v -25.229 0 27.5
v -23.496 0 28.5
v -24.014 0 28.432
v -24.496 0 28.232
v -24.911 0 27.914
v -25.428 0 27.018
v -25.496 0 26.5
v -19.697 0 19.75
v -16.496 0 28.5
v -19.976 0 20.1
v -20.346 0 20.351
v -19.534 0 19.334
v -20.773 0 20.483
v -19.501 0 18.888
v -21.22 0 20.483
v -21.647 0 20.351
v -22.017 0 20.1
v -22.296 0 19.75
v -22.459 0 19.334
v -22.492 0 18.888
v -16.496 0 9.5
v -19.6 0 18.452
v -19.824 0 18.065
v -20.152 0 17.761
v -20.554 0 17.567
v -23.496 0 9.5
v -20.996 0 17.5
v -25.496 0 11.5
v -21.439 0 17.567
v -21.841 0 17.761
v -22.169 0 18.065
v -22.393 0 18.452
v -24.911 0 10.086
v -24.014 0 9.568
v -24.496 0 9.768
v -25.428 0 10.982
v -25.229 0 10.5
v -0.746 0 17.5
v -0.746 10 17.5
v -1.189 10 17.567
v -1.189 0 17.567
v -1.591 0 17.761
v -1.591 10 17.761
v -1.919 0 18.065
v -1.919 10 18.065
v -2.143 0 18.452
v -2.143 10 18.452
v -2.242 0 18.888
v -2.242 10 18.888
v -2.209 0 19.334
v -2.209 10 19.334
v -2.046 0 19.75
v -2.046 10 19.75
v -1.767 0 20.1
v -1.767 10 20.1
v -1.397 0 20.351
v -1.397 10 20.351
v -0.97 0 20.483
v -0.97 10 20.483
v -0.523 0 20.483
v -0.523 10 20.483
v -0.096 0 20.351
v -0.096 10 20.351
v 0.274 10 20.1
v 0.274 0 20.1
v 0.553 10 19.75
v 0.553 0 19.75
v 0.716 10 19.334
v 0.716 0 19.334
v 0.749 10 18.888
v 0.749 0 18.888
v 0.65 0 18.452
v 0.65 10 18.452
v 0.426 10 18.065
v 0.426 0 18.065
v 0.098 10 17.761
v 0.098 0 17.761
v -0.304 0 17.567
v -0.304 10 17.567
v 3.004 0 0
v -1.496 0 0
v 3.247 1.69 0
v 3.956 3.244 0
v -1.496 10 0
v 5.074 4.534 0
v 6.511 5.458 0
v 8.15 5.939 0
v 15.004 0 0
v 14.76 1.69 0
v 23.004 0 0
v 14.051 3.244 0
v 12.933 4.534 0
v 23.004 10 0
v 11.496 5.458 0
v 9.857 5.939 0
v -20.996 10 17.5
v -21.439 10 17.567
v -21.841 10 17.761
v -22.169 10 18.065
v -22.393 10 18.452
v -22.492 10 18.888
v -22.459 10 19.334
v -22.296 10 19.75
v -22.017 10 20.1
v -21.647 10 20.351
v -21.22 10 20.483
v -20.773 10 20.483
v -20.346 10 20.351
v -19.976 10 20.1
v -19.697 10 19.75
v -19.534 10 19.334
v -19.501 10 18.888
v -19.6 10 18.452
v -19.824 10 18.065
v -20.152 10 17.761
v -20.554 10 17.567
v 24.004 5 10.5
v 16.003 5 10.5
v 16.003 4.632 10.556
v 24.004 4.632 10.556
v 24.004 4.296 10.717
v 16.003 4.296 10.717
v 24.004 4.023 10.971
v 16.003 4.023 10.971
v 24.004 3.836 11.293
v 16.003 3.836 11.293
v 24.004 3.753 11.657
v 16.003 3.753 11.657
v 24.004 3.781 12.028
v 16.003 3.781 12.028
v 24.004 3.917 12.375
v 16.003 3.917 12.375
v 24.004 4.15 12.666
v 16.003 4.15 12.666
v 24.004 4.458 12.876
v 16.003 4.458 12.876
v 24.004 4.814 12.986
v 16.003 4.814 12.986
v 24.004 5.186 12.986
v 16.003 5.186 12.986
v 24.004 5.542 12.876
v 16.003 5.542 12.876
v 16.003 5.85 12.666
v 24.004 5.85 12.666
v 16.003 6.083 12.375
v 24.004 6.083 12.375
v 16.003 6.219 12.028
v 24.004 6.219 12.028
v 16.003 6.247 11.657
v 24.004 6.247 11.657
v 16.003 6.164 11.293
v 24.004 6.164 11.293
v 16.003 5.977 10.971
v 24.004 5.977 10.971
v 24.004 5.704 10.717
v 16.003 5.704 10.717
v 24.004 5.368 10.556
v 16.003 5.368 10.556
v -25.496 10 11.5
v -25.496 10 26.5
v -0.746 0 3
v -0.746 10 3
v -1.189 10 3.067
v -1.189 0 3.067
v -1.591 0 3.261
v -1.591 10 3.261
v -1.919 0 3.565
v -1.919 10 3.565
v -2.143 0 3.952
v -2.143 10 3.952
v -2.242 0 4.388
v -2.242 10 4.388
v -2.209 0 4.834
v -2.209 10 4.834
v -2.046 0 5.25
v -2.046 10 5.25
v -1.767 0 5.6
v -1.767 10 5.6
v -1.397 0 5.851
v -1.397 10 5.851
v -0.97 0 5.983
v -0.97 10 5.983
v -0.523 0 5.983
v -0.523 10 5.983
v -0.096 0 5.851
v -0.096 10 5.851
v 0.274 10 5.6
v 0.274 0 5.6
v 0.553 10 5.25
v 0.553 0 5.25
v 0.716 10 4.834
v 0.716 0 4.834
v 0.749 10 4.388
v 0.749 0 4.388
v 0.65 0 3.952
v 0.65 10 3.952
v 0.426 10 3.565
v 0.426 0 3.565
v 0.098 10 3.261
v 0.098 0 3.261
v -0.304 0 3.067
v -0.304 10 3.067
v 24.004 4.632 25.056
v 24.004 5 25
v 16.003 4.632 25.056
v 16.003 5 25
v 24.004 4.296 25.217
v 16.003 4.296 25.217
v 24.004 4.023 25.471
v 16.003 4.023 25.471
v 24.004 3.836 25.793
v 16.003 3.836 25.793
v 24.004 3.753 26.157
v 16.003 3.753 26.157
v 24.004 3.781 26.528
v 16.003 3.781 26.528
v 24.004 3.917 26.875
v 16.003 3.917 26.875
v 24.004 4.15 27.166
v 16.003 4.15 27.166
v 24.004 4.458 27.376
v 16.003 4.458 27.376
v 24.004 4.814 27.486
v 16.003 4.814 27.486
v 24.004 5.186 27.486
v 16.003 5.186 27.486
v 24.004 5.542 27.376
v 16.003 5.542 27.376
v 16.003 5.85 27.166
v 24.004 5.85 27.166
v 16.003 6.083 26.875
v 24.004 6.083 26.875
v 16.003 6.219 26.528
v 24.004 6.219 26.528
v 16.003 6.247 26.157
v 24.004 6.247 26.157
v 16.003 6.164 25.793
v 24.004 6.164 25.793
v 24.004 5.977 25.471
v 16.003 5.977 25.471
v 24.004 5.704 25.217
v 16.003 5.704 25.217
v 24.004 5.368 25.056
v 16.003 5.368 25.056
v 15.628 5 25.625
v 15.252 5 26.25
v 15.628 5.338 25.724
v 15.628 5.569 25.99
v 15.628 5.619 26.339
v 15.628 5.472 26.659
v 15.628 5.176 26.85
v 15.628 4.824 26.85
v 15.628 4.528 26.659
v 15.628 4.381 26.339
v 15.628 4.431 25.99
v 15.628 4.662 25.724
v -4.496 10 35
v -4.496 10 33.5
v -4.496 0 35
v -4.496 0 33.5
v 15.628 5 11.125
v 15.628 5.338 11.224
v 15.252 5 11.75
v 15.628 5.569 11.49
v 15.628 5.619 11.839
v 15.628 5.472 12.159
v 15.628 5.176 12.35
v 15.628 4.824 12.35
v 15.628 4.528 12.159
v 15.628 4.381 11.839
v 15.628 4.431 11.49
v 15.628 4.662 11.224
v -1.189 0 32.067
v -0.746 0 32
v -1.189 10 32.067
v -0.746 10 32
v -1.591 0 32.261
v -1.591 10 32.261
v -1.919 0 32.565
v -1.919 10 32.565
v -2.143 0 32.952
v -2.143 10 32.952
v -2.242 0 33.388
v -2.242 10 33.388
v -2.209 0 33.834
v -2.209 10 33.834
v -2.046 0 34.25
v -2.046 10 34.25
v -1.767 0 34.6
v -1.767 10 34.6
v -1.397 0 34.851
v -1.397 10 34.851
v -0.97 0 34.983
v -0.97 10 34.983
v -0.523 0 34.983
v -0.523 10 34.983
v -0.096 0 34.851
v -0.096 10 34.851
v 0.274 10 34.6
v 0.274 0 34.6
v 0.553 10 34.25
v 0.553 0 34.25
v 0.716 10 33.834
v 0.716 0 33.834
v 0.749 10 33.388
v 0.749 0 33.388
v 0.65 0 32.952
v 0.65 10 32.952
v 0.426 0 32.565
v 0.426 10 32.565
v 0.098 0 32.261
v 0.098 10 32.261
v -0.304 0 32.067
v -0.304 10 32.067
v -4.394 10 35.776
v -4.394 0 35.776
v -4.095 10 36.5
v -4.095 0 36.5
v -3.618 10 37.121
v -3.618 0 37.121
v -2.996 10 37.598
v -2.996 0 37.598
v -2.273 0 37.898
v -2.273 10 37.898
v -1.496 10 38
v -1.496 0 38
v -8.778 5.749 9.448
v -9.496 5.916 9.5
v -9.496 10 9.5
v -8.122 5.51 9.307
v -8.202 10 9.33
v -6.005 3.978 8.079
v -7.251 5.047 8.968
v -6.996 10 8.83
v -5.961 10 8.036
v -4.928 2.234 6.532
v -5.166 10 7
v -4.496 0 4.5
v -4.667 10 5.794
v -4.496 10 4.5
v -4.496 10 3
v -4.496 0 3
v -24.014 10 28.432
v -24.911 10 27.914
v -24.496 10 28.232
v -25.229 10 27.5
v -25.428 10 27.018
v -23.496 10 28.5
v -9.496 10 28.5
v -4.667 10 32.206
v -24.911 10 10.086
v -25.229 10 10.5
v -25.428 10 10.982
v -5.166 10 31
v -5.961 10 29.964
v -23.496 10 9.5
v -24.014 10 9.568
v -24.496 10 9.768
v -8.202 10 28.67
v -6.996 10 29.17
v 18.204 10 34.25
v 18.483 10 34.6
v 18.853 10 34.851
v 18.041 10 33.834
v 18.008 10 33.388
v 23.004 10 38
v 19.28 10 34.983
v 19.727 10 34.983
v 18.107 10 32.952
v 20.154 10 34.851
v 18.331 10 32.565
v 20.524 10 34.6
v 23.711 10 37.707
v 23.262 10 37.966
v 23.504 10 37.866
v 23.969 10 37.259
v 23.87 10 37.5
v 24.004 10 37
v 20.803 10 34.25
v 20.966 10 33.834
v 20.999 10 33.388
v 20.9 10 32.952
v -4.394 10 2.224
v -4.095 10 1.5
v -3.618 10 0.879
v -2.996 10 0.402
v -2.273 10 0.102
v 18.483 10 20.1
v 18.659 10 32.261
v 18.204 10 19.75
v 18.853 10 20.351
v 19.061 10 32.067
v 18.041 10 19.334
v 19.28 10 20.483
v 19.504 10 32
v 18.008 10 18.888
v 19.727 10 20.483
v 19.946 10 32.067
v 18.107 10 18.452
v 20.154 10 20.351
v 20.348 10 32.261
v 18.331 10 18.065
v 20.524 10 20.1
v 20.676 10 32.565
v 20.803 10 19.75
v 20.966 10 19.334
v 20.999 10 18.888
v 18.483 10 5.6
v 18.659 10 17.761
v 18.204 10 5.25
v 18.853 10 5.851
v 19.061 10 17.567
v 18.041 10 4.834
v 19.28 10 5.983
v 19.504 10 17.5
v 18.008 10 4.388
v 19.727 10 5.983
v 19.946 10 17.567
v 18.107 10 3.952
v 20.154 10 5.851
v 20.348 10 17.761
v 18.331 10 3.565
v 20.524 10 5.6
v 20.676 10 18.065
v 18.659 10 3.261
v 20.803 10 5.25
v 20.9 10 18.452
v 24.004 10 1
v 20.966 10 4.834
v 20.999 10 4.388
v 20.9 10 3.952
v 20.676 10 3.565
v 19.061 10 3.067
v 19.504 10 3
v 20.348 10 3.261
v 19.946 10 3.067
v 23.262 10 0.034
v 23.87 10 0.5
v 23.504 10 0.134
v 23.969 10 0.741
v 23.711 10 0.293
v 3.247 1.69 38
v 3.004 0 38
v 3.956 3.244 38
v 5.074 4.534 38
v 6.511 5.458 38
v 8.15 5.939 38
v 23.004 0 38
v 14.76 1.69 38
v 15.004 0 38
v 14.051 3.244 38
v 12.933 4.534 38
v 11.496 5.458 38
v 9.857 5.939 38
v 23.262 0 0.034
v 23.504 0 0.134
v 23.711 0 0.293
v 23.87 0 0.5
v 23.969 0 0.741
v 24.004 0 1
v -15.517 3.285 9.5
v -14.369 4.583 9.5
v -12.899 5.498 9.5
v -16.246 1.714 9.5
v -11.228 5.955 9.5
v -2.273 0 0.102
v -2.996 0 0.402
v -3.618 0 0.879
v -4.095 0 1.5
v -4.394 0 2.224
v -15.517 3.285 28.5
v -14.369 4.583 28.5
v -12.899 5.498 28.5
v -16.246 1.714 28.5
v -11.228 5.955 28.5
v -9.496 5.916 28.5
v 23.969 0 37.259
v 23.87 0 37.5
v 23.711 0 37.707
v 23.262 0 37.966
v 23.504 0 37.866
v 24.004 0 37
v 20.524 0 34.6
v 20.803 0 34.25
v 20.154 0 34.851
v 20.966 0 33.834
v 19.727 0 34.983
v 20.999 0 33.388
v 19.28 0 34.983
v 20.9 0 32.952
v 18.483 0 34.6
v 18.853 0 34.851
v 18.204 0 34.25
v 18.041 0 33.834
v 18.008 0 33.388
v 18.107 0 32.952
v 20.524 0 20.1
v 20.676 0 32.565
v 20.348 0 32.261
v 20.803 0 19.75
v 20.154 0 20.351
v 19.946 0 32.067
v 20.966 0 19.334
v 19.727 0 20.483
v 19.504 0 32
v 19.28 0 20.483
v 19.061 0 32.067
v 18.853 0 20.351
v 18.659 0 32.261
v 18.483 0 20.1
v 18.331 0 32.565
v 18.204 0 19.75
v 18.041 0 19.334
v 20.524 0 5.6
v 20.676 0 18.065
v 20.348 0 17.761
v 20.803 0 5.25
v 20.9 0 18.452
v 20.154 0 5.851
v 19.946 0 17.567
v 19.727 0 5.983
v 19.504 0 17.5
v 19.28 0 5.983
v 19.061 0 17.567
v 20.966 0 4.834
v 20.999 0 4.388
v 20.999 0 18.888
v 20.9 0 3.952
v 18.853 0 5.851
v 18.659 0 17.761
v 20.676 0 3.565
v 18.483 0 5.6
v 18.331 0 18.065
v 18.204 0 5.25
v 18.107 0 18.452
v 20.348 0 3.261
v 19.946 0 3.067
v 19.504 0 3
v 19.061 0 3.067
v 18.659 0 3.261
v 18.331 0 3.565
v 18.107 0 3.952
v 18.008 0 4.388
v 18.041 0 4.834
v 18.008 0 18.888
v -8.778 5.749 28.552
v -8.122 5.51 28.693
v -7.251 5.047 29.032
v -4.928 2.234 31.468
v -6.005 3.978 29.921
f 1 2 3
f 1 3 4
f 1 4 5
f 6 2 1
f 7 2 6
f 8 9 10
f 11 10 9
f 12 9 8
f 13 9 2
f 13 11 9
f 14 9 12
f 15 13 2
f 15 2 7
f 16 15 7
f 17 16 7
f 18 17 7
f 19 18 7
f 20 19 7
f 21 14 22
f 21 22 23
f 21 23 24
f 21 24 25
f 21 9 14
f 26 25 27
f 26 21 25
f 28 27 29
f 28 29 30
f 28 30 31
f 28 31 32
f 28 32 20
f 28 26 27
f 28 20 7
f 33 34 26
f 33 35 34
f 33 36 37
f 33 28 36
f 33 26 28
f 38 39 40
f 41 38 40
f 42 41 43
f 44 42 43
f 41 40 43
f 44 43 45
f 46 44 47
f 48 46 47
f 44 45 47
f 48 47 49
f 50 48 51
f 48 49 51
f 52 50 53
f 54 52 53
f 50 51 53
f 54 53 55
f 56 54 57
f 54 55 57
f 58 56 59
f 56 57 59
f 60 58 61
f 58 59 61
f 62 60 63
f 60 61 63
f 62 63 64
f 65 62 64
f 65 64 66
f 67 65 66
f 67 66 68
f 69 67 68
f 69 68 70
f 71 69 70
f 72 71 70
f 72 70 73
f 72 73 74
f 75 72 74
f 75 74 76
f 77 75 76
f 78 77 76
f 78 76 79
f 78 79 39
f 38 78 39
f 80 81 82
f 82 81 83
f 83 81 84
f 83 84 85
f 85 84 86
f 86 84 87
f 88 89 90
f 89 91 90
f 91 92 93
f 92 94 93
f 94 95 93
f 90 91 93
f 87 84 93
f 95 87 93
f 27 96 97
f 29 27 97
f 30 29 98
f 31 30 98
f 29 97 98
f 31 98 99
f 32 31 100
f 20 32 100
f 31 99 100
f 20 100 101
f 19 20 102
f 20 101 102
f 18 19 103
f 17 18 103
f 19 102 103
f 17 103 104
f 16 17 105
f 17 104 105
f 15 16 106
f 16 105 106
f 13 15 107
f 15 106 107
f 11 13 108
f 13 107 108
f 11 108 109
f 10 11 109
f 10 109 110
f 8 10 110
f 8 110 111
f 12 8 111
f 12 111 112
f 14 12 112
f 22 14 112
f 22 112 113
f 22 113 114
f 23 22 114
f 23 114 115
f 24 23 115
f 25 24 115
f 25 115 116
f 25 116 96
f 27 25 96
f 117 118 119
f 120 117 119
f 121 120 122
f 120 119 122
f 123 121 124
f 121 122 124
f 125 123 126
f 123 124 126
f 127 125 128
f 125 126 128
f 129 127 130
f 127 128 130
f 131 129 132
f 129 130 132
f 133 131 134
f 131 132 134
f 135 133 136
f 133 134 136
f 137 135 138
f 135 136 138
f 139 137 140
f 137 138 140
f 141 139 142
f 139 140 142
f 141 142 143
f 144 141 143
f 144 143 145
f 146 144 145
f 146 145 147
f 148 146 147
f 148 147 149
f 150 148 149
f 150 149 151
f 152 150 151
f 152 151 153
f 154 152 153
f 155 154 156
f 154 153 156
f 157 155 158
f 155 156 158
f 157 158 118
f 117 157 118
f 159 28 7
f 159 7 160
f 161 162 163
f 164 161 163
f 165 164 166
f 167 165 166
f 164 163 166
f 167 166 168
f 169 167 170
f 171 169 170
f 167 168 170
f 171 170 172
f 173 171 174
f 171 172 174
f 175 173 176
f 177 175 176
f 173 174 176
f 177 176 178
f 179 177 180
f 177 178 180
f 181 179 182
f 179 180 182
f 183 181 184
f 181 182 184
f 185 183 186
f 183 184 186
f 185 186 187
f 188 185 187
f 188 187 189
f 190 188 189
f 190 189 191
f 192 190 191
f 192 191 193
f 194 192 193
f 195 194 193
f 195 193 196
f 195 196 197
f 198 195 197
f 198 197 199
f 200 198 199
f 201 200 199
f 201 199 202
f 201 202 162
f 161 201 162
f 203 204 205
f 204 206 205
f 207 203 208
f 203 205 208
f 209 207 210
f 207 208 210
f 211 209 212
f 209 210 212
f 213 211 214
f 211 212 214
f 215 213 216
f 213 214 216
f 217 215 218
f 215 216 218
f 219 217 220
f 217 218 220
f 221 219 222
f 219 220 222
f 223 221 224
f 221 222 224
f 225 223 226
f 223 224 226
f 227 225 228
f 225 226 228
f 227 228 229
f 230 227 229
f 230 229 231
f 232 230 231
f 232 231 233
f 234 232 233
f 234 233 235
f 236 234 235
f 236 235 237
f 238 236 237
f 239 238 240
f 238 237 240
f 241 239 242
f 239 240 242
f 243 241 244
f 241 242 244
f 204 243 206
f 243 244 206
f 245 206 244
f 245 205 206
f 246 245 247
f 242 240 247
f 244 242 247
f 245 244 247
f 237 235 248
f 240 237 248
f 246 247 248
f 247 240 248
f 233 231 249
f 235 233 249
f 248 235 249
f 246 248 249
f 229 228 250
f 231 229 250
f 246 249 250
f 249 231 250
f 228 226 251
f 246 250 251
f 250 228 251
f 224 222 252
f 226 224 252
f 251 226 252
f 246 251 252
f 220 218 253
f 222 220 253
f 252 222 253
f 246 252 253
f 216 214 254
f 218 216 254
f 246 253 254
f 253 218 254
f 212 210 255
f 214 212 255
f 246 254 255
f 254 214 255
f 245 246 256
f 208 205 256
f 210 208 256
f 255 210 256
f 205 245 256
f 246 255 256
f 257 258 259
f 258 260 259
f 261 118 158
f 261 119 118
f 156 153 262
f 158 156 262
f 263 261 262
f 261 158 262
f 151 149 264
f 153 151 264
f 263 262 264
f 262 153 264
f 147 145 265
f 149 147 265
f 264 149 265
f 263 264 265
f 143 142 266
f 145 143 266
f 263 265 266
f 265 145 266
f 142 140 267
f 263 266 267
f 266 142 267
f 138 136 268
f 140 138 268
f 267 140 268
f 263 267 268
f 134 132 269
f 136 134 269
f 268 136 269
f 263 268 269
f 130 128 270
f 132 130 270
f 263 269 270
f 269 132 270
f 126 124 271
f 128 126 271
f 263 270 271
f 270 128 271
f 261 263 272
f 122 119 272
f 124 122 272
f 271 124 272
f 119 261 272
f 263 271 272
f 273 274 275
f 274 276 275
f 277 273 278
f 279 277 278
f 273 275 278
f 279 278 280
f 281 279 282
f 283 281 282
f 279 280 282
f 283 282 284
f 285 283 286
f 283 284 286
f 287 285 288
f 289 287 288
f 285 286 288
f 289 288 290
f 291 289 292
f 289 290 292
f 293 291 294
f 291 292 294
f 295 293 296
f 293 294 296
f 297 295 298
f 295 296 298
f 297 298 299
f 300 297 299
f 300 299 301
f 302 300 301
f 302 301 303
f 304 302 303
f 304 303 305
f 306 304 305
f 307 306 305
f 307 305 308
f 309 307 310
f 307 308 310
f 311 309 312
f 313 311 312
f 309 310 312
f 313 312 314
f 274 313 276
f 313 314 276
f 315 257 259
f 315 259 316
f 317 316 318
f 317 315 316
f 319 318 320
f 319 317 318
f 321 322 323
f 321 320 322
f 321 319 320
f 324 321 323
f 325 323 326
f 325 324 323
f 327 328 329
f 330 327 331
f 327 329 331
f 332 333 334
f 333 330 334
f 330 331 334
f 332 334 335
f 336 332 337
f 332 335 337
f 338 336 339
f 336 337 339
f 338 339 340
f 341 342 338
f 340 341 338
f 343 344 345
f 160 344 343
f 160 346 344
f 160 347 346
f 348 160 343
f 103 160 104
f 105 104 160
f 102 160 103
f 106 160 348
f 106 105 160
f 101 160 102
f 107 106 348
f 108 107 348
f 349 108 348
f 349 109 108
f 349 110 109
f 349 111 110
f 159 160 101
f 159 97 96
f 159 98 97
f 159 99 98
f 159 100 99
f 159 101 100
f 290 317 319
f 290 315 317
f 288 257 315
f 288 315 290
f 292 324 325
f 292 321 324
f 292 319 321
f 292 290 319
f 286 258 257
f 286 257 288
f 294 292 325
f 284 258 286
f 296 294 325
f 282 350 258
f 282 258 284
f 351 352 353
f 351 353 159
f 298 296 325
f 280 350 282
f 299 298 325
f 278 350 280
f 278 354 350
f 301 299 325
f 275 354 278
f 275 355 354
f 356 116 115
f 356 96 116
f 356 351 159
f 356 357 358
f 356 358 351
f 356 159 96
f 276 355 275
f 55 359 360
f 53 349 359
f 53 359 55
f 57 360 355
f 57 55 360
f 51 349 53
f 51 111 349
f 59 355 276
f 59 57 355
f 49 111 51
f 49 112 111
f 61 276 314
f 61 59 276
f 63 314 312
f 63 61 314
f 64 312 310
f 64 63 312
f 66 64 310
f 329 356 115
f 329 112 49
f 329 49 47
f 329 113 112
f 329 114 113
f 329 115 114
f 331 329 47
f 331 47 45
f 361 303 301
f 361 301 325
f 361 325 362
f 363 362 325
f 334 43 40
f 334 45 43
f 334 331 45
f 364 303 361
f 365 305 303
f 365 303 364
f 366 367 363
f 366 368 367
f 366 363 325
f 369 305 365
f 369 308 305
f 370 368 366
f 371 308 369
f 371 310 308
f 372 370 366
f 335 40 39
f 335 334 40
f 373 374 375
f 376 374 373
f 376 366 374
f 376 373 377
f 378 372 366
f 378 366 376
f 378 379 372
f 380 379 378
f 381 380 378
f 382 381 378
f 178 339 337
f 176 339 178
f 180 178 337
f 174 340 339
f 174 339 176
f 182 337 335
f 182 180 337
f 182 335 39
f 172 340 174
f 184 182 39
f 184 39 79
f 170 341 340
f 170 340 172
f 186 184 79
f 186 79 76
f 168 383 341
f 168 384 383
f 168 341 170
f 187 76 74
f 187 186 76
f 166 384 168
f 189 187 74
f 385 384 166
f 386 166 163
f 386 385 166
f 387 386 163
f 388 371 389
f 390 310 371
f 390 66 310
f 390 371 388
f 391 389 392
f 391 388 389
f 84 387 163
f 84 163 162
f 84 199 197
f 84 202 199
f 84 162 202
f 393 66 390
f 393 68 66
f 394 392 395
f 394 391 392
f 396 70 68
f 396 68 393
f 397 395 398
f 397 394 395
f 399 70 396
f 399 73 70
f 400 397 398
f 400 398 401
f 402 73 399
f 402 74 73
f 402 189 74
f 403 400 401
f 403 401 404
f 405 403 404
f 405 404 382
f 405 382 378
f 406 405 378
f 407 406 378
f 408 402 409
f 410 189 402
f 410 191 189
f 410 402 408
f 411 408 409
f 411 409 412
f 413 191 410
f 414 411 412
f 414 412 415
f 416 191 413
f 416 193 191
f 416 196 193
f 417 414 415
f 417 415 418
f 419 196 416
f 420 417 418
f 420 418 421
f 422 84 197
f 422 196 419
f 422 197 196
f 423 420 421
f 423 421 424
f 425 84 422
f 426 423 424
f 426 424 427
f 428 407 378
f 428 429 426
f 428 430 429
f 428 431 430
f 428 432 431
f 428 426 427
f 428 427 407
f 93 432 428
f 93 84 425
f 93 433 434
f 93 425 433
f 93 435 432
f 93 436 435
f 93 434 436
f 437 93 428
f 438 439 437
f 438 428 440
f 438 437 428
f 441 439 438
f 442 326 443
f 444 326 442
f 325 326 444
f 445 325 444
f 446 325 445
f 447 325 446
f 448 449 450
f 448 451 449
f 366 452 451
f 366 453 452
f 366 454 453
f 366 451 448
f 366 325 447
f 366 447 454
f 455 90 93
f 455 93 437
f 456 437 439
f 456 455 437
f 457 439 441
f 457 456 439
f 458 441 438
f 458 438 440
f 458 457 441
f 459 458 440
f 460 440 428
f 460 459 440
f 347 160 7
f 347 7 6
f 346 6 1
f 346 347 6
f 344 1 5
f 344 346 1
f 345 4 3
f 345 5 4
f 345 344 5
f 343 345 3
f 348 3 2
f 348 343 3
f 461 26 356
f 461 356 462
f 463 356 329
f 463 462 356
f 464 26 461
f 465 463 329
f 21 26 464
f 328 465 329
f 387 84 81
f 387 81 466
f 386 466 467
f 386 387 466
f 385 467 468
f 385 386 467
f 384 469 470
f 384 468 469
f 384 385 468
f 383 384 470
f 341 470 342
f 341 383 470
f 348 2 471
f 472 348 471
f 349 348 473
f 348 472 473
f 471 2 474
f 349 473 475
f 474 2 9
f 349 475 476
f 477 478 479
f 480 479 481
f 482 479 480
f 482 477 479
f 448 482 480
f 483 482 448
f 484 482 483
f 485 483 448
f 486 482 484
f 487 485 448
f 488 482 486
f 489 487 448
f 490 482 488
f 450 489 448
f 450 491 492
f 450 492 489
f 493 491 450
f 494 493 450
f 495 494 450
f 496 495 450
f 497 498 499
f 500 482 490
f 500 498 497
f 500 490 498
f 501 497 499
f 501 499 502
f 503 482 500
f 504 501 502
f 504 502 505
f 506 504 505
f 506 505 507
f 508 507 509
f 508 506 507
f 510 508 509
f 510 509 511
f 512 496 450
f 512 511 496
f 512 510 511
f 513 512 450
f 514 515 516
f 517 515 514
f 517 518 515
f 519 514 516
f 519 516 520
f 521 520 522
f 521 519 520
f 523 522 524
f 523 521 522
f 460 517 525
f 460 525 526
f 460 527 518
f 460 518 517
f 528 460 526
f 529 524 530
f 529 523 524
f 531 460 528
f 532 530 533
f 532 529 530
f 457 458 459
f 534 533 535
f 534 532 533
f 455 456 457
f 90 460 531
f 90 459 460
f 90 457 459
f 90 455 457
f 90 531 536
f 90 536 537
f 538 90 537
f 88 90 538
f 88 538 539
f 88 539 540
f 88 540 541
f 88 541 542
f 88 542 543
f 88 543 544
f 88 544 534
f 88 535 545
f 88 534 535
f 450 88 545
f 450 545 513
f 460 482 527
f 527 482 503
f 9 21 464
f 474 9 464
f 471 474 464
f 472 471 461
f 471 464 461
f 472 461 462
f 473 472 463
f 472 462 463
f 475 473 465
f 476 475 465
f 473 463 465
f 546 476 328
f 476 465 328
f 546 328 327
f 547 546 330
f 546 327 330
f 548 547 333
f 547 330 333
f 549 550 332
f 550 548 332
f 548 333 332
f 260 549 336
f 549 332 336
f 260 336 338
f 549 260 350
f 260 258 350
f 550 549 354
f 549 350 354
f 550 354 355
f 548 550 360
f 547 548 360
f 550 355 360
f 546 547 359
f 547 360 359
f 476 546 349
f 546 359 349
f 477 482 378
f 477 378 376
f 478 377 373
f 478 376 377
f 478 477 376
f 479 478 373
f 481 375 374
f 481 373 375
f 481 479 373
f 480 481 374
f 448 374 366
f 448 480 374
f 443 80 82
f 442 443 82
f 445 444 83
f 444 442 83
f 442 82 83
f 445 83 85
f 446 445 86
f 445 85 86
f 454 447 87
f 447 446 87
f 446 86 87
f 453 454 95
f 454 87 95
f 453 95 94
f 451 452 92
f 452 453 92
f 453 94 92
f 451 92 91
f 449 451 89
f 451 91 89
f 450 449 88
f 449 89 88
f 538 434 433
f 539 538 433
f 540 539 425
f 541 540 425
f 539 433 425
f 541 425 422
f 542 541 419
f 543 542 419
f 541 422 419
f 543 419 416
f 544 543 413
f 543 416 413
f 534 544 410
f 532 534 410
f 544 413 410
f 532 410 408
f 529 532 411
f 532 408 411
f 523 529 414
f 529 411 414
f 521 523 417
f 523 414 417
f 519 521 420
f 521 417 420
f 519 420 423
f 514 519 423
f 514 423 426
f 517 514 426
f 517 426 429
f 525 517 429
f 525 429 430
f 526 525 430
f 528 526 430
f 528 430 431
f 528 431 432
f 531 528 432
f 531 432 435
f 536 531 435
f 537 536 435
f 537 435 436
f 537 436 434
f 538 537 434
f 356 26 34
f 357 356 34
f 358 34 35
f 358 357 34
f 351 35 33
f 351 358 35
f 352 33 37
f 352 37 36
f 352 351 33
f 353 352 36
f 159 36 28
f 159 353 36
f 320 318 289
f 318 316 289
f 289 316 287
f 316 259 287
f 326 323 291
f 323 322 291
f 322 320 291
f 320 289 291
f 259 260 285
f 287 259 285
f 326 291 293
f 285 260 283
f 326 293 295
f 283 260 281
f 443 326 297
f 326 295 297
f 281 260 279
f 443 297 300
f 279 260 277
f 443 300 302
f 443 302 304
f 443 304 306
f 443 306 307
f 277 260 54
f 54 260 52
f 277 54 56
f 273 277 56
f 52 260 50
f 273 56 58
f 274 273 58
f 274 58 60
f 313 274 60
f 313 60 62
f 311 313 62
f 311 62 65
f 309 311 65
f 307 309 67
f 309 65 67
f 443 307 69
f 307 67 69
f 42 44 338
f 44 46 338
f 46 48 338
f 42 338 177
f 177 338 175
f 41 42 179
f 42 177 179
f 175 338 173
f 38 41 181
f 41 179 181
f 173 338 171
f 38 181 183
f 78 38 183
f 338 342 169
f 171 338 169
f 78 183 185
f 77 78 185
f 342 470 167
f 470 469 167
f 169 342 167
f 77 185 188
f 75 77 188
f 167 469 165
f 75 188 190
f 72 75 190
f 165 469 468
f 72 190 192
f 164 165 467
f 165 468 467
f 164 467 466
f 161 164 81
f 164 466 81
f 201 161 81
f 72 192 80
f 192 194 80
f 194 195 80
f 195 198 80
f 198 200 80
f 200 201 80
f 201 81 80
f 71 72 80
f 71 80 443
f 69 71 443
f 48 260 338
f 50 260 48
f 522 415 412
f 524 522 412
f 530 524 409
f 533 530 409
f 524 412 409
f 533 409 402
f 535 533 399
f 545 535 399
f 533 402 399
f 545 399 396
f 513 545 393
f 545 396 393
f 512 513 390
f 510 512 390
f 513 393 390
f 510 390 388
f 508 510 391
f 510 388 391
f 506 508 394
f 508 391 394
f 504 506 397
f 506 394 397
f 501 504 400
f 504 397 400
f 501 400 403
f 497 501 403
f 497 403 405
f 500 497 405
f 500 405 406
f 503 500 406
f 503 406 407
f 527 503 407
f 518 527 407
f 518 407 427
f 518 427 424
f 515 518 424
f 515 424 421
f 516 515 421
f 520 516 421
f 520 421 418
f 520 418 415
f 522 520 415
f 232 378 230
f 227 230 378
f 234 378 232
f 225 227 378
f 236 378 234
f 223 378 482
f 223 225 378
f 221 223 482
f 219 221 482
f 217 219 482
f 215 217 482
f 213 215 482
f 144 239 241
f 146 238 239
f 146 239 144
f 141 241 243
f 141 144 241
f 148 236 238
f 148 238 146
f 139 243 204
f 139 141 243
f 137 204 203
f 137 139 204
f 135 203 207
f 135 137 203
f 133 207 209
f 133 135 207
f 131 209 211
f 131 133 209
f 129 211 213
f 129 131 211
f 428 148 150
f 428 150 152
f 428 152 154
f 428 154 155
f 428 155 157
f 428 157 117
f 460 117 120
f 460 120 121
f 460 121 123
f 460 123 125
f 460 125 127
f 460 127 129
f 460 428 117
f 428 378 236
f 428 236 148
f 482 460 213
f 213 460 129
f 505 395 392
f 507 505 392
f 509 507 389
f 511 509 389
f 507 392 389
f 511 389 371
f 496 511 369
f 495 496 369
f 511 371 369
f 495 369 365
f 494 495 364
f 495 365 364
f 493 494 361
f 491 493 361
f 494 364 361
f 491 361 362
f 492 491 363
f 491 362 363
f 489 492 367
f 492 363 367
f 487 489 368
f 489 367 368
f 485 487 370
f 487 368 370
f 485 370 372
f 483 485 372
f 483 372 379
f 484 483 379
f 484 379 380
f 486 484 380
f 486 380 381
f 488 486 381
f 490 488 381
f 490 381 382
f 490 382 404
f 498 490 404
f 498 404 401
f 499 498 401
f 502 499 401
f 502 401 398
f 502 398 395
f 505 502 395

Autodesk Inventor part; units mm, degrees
ref_plane "YZ Plane" through (0, 0, 0) normal (1, 0, 0) x (0, 1, 0)
ref_plane "XZ Plane" through (0, 0, 0) normal (0, 1, 0) x (-1, 0, 0)
ref_plane "XY Plane" through (0, 0, 0) normal (0, 0, 1) x (1, 0, 0)
sketch "Sketch1" plane through (0, 0, 0) normal (0, 0, 1) x (1, 0, 0)
  circle A0 centre (9.0035, 0) radius 6
  circle A1 centre (-10.4965, 0) radius 6
  line L0 (-16.4965, 0) -> (-25.4965, 0)
  line L1 (-25.4965, 0) -> (-25.4965, 10)
  line L2 (-25.4965, 10) -> (24.0035, 10)
  line L3 (24.0035, 10) -> (24.0035, 0)
  line L4 (24.0035, 0) -> (15.0035, 0)
  line L5 (-4.4965, 0) -> (3.0035, 0)
  point P0 (0, 0)
  dimension "d4" = 12
  dimension "d5" = 12
  dimension "d6" = 19.5
  dimension "d7" = 0
  dimension "d8" = 0
  dimension "d9" = 9
  dimension "d10" = 9
  dimension "d11" = 10
  dimension "d12" = 0
extrude "Extrusion1" add sketch "Sketch1" along normal blind 38 contours A0 L5 A1 L0 L1 L2 L3 L4
sketch "Sketch2" plane through (-4.4965, 0, 0) normal (0, -1, 0) x (1, 0, 0)
  line L0 (-21, 0) -> (-12, 0) projected
  line L1 (-12, 0) -> (-12, 38) projected
  line L2 (-21, 38) -> (-12, 38) projected
  line L3 (-21, 0) -> (-21, 38) projected
  line L4 (0, 0) -> (7.5, 0) projected
  line L5 (7.5, 0) -> (7.5, 38) projected
  line L6 (0, 38) -> (7.5, 38) projected
  line L7 (0, 0) -> (0, 38) projected
  line L8 (19.5, 0) -> (28.5, 0) projected
  line L9 (28.5, 0) -> (28.5, 38) projected
  line L10 (19.5, 38) -> (28.5, 38) projected
  line L11 (19.5, 0) -> (19.5, 38) projected
  line L12 (-21, 0) -> (-12, 0) projected
  line L13 (-21, 0) -> (0, 0)
  line L14 (-21, 9.5) -> (0, 9.5)
  line L15 (-21, 28.5) -> (0, 28.5)
  line L16 (0, 0) -> (0, 38) projected
  line L17 (-12, 38) -> (0, 38) projected
  line L18 (-21, 38) -> (0, 38)
  point P0 (4.4965, 0)
  dimension "d17" = 19
  dimension "d18" = 9.5
extrude "Extrusion2" cut sketch "Sketch2" against normal through all contours L3 L14 L1 L0 | L1 L14 L7 L13 | L3 L2 L1 L15 | L1 L17 L7 L15
fillet "Fillet1" radius 5 2 edges at (-4.4965, 5, 28.5) (-4.4965, 5, 9.5)
fillet "Fillet2" radius 3 2 edges at (-4.4965, 5, 0) (-4.4965, 5, 38)
fillet "Fillet2" radius 1 2 edges at (24.0035, 5, 38) (24.0035, 5, 0)
fillet "Fillet2" radius 2 2 edges at (-25.4965, 5, 9.5) (-25.4965, 5, 28.5)
sketch "Sketch3" plane through (3.0035, 0, 0) normal (0, -1, 0) x (1, 0, 0)
  arc A0 (-28.5, 11.5) -> (-26.5, 9.5) centre (-26.5, 11.5) ccw projected
  line L0 (-26.5, 9.5) -> (-19.5, 9.5) projected
  line L1 (-19.5, 9.5) -> (-19.5, 28.5) projected
  line L2 (-19.5, 28.5) -> (-26.5, 28.5) projected
  arc A1 (-26.5, 28.5) -> (-28.5, 26.5) centre (-26.5, 26.5) ccw projected
  line L3 (-28.5, 11.5) -> (-28.5, 26.5) projected
  arc A2 (-4.5, 38) -> (-7.5, 35) centre (-4.5, 35) ccw projected
  line L4 (-7.5, 33.5) -> (-7.5, 35) projected
  line L5 (-7.5, 4.5) -> (-7.5, 33.5) projected
  line L6 (-7.5, 3) -> (-7.5, 4.5) projected
  arc A3 (-7.5, 3) -> (-4.5, 0) centre (-4.5, 3) ccw projected
  line L7 (-4.5, 0) -> (0, 0) projected
  line L8 (0, 0) -> (0, 38) projected
  line L9 (-4.5, 38) -> (0, 38) projected
  arc A4 (21, 37) -> (20, 38) centre (20, 37) ccw projected
  line L10 (12, 38) -> (20, 38) projected
  line L11 (12, 0) -> (12, 38) projected
  line L12 (12, 0) -> (20, 0) projected
  arc A5 (20, 0) -> (21, 1) centre (20, 1) ccw projected
  line L13 (21, 1) -> (21, 37) projected
  point P0 (-3.0035, 0)
  point P1 (-3.75, 4.5)
  point P2 (-3.75, 19)
  point P3 (-3.75, 33.5)
  point P4 (16.5, 4.5)
  point P5 (16.5, 19)
  point P6 (16.5, 33.5)
  point P7 (-24, 19)
  dimension "d23" = 7.5
  dimension "d24" = 3.75
  dimension "d25" = 9
  dimension "d26" = 4.5
  dimension "d27" = 9
  dimension "d28" = 4.5
  dimension "d29" = 19
  dimension "d30" = 9.5
  dimension "d31" = 4.5
  dimension "d32" = 4.5
hole "Hole1" at (-0.7465, 0, 4.5) at (-0.7465, 0, 19) at (-0.7465, 0, 33.5) at (19.5035, 0, 4.5) at (19.5035, 0, 19) at (19.5035, 0, 33.5) at (-20.9965, 0, 19) direction (0, 1, 0) diameter 3 end through all
sketch "Sketch4" plane through (24.0035, 0, 1) normal (1, 0, 0) x (0, 0, -1)
  line L0 (-16.5, 10) -> (-16.5, 0) projected
  line L1 (-19.5, 10) -> (-19.5, 0) projected
  line L2 (-31, 10) -> (-31, 0) projected
  line L3 (-5, 10) -> (-5, 0) projected
  line L4 (0, 10) -> (0, 0) projected
  line L5 (0, 10) -> (-36, 10) projected
  line L6 (-36, 0) -> (-36, 10) projected
  line L7 (0, 0) -> (-36, 0) projected
  point P0 (1, 0)
  point P1 (-25.25, 5)
  point P2 (-10.75, 5)
  dimension "d41" = 11.5
  dimension "d42" = 11.5
  dimension "d43" = 5.75
  dimension "d44" = 5.75
  dimension "d45" = 10
  dimension "d46" = 5
hole "Hole2" at (24.0035, 5, 26.25) at (24.0035, 5, 11.75) direction (-1, 0, 0) diameter 2.5 depth 8 tip angle 118
equation "\"d24\" = 0.5 * d23"
equation "\"d26\" = 0.5 * d25"
equation "\"d28\" = 0.5 * d27"
equation "\"d30\" = 0.5 * d29"
equation "\"d32\" = d31"
equation "\"d43\" = 0.5 * d41"
equation "\"d44\" = 0.5 * d42"
equation "\"d46\" = 0.5 * d45"
properties part number "3DP_PLA_X_axis_carriage_half" material "ABS Plastic"
